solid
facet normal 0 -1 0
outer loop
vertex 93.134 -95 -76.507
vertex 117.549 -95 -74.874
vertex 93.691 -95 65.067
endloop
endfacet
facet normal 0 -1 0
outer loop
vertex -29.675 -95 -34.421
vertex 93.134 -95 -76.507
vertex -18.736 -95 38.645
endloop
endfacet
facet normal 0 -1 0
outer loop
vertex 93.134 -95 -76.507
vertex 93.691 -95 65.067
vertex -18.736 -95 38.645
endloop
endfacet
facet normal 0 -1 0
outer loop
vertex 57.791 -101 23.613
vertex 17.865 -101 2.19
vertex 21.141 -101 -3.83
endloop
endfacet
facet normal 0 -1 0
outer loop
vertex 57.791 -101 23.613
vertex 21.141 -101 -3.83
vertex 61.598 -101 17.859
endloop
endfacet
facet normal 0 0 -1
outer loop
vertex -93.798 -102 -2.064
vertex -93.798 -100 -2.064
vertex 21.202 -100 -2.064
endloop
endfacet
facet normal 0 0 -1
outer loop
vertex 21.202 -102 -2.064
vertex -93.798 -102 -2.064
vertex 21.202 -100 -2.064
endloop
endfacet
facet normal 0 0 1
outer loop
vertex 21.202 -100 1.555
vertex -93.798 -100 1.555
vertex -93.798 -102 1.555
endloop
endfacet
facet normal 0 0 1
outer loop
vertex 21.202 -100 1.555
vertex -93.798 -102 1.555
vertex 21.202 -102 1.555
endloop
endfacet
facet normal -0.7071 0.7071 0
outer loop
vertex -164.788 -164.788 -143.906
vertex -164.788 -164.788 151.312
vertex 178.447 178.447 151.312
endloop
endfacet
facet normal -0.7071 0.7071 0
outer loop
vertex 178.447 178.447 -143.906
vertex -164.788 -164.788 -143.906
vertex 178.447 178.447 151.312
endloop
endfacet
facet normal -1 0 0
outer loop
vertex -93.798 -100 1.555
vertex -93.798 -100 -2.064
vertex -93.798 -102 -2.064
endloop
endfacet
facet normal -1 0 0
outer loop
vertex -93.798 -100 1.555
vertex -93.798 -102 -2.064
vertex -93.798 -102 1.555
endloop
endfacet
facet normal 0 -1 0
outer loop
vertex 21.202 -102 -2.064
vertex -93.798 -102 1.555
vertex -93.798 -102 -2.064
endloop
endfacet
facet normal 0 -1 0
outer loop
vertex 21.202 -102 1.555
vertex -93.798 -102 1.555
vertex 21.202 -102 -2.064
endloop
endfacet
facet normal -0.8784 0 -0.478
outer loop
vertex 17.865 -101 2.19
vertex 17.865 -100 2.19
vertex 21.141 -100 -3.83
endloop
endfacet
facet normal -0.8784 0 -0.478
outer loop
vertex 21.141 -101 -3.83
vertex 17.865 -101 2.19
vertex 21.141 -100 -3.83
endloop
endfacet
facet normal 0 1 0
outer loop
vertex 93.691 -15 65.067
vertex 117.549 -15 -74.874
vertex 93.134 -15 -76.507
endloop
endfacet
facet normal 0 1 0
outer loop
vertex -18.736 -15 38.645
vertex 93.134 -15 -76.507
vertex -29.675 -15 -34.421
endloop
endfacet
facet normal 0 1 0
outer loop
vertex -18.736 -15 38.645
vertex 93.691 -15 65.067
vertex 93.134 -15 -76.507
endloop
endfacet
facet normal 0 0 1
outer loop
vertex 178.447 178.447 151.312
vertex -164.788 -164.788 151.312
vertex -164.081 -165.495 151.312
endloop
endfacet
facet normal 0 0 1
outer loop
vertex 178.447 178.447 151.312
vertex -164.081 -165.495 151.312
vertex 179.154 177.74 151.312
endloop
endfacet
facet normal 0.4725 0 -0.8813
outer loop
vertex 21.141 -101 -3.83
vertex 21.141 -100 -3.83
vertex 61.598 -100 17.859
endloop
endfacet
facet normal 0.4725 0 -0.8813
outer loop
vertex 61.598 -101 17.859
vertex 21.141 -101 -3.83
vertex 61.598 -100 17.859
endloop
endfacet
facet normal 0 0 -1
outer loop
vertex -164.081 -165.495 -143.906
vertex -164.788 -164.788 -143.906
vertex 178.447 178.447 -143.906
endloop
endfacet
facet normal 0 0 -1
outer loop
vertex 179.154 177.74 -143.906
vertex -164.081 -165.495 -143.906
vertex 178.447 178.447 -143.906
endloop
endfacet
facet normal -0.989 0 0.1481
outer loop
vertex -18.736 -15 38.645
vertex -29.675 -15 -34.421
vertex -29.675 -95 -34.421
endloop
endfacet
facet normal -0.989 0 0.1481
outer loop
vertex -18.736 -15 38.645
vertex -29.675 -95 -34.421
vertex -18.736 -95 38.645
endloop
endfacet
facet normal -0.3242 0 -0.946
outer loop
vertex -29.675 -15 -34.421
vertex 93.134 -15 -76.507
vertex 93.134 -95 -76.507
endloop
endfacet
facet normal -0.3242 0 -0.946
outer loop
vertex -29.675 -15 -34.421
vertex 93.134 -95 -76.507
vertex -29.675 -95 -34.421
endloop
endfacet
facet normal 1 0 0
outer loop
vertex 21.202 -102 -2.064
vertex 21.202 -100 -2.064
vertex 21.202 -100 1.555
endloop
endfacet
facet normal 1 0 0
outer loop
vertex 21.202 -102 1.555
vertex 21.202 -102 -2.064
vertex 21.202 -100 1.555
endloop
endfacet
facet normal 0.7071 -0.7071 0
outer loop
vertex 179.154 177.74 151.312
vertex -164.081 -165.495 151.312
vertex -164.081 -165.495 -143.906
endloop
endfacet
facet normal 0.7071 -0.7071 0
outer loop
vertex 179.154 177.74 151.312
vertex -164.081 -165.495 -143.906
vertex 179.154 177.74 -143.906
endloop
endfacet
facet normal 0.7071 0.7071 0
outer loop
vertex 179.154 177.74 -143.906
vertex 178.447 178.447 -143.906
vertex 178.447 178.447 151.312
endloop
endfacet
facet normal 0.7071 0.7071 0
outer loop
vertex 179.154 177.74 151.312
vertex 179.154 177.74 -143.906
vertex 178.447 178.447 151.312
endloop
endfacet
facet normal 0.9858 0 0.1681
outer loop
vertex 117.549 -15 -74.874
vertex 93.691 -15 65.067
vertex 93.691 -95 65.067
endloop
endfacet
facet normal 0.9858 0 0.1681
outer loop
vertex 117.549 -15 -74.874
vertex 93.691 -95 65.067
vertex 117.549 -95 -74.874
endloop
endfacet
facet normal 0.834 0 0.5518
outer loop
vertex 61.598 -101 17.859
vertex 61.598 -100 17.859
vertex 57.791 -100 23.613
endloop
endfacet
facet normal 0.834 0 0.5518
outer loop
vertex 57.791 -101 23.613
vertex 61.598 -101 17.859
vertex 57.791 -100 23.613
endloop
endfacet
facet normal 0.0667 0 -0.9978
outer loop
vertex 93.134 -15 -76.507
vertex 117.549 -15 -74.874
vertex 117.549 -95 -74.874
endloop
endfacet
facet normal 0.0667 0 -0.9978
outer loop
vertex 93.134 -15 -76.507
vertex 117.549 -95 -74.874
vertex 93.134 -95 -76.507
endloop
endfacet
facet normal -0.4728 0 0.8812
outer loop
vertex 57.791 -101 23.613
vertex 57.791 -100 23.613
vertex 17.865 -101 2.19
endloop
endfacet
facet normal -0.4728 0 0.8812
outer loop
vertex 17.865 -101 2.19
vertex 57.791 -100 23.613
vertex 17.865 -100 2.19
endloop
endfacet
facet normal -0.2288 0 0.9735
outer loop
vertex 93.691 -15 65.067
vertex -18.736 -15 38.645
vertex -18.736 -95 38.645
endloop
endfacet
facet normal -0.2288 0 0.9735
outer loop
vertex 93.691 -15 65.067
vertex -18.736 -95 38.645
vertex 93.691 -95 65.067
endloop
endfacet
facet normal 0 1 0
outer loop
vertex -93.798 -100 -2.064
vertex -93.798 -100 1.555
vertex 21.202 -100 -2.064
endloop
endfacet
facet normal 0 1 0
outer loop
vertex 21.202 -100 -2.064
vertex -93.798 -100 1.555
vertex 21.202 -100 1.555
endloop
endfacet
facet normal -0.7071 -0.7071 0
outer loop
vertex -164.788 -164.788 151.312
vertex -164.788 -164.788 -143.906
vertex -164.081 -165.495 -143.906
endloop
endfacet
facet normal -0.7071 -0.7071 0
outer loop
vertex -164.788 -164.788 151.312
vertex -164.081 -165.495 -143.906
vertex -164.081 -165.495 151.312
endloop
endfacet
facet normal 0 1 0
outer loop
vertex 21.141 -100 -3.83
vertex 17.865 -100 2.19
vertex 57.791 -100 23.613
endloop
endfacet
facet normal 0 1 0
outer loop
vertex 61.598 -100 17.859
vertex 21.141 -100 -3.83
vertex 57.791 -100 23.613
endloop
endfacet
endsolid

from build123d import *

# Parameters (mm, degrees)
PAD_DEPTH    = 80
SKETCH001_W  = 115
SKETCH001_H  = 3.61845
PAD001_DEPTH = 2
SKETCH002_W  = 485.407379
SKETCH002_H  = 295.218536
PAD002_DEPTH = 1
PAD003_DEPTH = 1


with BuildPart() as clock:
    # Sketch → Pad (new body)
    with BuildSketch(Plane.XZ):
        Polygon((-18.735967, 38.644798), (93.691037, 65.066546), (117.549288, -74.874246), (93.133817, -76.506926), (-29.674964, -34.420876), align=None)
    extrude(amount=PAD_DEPTH)


with BuildPart() as clock_1:
    # Body001 placement: moved
    add(clock.part.moved(Location((0, -15, 0))))


with BuildPart() as mins:
    # Sketch001 → Pad001 (new body)
    with BuildSketch(Plane.XZ.offset(100)):
        with Locations((-36.29836, -0.254388)):
            Rectangle(SKETCH001_W, SKETCH001_H)
    extrude(amount=PAD001_DEPTH)


with BuildPart() as wall:
    # Sketch002 → Pad002 (new body)
    with BuildSketch(Plane(origin=(0, 0, 0), x_dir=(0.707107, 0.707107, 0), z_dir=(0.707107, -0.707107, 0))):
        with Locations((9.658203, 3.703232)):
            Rectangle(SKETCH002_W, SKETCH002_H)
    extrude(amount=PAD002_DEPTH)


with BuildPart() as hours:
    # Sketch003 → Pad003 (new body)
    with BuildSketch(Plane.XZ.offset(100)):
        Polygon((17.86513, 2.189523), (21.14066, -3.830374), (61.5979, 17.858953), (57.791188, 23.613267), align=None)
    extrude(amount=PAD003_DEPTH)


solid = Compound([clock_1.part, mins.part, wall.part, hours.part])
